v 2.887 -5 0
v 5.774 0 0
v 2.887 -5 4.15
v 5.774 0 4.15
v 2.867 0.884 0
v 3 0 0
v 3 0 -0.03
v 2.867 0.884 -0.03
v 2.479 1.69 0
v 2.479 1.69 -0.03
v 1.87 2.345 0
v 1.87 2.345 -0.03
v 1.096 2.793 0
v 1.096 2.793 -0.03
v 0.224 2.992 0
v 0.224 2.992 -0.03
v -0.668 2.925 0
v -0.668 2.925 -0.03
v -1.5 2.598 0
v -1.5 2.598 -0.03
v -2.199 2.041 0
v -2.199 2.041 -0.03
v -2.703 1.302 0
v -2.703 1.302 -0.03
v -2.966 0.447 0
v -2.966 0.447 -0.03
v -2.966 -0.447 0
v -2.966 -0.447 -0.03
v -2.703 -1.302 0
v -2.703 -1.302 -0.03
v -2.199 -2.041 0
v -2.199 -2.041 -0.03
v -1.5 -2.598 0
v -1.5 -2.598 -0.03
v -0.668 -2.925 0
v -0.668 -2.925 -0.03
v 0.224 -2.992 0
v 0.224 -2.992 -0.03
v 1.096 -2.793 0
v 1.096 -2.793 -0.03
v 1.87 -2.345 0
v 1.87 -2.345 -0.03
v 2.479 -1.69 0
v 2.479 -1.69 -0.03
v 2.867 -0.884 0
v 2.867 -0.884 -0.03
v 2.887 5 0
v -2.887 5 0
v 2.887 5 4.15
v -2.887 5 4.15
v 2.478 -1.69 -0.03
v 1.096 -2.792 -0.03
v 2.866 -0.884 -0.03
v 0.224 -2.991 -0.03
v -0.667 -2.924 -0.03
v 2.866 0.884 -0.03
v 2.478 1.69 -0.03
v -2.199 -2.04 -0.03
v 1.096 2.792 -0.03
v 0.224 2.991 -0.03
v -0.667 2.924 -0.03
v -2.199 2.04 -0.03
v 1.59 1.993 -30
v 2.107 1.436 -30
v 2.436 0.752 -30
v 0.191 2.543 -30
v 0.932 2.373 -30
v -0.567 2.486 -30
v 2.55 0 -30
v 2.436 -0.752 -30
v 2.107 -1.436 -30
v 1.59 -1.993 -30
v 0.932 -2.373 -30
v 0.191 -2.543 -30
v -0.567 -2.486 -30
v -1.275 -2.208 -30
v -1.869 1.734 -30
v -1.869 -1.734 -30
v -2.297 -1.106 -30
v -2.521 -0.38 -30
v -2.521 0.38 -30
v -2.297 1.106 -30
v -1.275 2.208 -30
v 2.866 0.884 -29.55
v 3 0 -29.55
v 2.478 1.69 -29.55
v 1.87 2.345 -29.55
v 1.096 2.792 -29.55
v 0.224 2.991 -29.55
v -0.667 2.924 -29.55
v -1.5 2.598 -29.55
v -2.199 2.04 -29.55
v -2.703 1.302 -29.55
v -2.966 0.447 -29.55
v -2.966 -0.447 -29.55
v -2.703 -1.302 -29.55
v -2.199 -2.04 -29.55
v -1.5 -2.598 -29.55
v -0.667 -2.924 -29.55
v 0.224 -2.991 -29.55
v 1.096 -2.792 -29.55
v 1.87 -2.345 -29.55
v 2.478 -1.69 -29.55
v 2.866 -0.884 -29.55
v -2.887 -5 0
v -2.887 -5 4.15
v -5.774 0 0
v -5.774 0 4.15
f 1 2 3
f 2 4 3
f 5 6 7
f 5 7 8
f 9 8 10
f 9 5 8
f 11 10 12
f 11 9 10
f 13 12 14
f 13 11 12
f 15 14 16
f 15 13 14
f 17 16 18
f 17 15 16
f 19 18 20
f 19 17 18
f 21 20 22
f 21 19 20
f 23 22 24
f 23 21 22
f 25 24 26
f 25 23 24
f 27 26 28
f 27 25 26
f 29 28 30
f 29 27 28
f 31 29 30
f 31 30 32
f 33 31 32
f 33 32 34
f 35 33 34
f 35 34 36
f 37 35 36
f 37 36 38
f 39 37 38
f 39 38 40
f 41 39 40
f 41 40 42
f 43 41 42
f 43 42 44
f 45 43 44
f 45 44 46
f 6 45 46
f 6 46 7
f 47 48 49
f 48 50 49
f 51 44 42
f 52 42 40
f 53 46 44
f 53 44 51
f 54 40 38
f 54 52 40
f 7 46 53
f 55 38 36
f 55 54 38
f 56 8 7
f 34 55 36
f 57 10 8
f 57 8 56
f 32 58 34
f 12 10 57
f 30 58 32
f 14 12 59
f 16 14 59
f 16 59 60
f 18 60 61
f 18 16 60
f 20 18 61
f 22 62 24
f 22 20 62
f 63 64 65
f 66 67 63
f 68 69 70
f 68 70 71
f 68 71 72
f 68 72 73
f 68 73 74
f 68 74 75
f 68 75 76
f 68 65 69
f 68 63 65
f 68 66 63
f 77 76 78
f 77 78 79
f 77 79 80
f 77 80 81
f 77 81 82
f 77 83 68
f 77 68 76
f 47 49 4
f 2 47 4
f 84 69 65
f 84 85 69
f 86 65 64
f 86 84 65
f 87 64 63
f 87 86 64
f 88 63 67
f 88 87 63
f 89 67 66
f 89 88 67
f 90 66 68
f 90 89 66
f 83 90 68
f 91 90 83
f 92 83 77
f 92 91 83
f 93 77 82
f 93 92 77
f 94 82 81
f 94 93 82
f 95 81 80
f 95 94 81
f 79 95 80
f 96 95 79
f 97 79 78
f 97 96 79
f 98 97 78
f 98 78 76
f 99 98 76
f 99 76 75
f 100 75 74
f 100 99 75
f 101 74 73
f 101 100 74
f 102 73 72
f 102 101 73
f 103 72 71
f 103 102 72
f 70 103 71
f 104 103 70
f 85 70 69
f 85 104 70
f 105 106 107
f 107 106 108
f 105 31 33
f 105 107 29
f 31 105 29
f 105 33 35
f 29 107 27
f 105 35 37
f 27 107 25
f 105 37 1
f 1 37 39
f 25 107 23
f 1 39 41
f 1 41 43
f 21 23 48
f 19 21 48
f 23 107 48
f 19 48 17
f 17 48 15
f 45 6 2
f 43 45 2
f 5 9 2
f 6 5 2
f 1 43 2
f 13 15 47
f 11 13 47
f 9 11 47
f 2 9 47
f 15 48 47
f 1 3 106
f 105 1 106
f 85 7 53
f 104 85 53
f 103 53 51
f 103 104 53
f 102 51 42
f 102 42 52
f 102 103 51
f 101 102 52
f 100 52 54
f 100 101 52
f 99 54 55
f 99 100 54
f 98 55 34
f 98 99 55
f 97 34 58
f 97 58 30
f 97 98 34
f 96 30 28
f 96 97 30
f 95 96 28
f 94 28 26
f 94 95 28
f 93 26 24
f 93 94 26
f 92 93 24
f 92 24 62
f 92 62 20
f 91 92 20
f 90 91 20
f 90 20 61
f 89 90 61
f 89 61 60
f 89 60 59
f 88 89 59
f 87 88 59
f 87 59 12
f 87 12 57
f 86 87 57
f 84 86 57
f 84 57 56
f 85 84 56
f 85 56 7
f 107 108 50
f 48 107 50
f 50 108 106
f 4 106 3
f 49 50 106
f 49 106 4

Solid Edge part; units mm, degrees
sketch "Sketch1" plane through (0, 0, 0) normal (0, 0, 1) x (1, 0, 0)
  circle A0 centre (0, 0) radius 5.8
  dimension "D1" = 11.6
extrude "Protrusion1" add sketch "Sketch1" along normal blind 4.15
sketch "Sketch2" plane through (0, 0, 0) normal (0, 0, -1) x (1, 0, 0)
  circle A0 centre (0, 0) radius 3
extrude "Protrusion2" add sketch "Sketch2" along normal blind 30
sketch "Sketch3" plane through (0, 0, -30) normal (0, 0, -1) x (1, 0, 0)
  circle A0 centre (0, 0) radius 2.9997
extrude "Cutout1" cut sketch "Sketch3" against normal blind 29.97 flip side to cut
chamfer "Chamfer_1" distance 0.45 angle 45 1 edges at (-2.9997, 0, -30)
sketch "Sketch4" plane through (0, 0, 4.15) normal (0, 0, 1) x (1, 0, 0)
  line L0 (-2.9394, 5) -> (2.9394, 5)
  dimension "D1" = 10
extrude "Cutout2" cut sketch "Sketch4" against normal up to next material side at (0, 5.05, 4.15)
pattern_circular "Pattern1" count 6 over 360 about axis through (0, 0, 4.15) along (0, 0, 1) of "Cutout2"
properties part number "185627"
